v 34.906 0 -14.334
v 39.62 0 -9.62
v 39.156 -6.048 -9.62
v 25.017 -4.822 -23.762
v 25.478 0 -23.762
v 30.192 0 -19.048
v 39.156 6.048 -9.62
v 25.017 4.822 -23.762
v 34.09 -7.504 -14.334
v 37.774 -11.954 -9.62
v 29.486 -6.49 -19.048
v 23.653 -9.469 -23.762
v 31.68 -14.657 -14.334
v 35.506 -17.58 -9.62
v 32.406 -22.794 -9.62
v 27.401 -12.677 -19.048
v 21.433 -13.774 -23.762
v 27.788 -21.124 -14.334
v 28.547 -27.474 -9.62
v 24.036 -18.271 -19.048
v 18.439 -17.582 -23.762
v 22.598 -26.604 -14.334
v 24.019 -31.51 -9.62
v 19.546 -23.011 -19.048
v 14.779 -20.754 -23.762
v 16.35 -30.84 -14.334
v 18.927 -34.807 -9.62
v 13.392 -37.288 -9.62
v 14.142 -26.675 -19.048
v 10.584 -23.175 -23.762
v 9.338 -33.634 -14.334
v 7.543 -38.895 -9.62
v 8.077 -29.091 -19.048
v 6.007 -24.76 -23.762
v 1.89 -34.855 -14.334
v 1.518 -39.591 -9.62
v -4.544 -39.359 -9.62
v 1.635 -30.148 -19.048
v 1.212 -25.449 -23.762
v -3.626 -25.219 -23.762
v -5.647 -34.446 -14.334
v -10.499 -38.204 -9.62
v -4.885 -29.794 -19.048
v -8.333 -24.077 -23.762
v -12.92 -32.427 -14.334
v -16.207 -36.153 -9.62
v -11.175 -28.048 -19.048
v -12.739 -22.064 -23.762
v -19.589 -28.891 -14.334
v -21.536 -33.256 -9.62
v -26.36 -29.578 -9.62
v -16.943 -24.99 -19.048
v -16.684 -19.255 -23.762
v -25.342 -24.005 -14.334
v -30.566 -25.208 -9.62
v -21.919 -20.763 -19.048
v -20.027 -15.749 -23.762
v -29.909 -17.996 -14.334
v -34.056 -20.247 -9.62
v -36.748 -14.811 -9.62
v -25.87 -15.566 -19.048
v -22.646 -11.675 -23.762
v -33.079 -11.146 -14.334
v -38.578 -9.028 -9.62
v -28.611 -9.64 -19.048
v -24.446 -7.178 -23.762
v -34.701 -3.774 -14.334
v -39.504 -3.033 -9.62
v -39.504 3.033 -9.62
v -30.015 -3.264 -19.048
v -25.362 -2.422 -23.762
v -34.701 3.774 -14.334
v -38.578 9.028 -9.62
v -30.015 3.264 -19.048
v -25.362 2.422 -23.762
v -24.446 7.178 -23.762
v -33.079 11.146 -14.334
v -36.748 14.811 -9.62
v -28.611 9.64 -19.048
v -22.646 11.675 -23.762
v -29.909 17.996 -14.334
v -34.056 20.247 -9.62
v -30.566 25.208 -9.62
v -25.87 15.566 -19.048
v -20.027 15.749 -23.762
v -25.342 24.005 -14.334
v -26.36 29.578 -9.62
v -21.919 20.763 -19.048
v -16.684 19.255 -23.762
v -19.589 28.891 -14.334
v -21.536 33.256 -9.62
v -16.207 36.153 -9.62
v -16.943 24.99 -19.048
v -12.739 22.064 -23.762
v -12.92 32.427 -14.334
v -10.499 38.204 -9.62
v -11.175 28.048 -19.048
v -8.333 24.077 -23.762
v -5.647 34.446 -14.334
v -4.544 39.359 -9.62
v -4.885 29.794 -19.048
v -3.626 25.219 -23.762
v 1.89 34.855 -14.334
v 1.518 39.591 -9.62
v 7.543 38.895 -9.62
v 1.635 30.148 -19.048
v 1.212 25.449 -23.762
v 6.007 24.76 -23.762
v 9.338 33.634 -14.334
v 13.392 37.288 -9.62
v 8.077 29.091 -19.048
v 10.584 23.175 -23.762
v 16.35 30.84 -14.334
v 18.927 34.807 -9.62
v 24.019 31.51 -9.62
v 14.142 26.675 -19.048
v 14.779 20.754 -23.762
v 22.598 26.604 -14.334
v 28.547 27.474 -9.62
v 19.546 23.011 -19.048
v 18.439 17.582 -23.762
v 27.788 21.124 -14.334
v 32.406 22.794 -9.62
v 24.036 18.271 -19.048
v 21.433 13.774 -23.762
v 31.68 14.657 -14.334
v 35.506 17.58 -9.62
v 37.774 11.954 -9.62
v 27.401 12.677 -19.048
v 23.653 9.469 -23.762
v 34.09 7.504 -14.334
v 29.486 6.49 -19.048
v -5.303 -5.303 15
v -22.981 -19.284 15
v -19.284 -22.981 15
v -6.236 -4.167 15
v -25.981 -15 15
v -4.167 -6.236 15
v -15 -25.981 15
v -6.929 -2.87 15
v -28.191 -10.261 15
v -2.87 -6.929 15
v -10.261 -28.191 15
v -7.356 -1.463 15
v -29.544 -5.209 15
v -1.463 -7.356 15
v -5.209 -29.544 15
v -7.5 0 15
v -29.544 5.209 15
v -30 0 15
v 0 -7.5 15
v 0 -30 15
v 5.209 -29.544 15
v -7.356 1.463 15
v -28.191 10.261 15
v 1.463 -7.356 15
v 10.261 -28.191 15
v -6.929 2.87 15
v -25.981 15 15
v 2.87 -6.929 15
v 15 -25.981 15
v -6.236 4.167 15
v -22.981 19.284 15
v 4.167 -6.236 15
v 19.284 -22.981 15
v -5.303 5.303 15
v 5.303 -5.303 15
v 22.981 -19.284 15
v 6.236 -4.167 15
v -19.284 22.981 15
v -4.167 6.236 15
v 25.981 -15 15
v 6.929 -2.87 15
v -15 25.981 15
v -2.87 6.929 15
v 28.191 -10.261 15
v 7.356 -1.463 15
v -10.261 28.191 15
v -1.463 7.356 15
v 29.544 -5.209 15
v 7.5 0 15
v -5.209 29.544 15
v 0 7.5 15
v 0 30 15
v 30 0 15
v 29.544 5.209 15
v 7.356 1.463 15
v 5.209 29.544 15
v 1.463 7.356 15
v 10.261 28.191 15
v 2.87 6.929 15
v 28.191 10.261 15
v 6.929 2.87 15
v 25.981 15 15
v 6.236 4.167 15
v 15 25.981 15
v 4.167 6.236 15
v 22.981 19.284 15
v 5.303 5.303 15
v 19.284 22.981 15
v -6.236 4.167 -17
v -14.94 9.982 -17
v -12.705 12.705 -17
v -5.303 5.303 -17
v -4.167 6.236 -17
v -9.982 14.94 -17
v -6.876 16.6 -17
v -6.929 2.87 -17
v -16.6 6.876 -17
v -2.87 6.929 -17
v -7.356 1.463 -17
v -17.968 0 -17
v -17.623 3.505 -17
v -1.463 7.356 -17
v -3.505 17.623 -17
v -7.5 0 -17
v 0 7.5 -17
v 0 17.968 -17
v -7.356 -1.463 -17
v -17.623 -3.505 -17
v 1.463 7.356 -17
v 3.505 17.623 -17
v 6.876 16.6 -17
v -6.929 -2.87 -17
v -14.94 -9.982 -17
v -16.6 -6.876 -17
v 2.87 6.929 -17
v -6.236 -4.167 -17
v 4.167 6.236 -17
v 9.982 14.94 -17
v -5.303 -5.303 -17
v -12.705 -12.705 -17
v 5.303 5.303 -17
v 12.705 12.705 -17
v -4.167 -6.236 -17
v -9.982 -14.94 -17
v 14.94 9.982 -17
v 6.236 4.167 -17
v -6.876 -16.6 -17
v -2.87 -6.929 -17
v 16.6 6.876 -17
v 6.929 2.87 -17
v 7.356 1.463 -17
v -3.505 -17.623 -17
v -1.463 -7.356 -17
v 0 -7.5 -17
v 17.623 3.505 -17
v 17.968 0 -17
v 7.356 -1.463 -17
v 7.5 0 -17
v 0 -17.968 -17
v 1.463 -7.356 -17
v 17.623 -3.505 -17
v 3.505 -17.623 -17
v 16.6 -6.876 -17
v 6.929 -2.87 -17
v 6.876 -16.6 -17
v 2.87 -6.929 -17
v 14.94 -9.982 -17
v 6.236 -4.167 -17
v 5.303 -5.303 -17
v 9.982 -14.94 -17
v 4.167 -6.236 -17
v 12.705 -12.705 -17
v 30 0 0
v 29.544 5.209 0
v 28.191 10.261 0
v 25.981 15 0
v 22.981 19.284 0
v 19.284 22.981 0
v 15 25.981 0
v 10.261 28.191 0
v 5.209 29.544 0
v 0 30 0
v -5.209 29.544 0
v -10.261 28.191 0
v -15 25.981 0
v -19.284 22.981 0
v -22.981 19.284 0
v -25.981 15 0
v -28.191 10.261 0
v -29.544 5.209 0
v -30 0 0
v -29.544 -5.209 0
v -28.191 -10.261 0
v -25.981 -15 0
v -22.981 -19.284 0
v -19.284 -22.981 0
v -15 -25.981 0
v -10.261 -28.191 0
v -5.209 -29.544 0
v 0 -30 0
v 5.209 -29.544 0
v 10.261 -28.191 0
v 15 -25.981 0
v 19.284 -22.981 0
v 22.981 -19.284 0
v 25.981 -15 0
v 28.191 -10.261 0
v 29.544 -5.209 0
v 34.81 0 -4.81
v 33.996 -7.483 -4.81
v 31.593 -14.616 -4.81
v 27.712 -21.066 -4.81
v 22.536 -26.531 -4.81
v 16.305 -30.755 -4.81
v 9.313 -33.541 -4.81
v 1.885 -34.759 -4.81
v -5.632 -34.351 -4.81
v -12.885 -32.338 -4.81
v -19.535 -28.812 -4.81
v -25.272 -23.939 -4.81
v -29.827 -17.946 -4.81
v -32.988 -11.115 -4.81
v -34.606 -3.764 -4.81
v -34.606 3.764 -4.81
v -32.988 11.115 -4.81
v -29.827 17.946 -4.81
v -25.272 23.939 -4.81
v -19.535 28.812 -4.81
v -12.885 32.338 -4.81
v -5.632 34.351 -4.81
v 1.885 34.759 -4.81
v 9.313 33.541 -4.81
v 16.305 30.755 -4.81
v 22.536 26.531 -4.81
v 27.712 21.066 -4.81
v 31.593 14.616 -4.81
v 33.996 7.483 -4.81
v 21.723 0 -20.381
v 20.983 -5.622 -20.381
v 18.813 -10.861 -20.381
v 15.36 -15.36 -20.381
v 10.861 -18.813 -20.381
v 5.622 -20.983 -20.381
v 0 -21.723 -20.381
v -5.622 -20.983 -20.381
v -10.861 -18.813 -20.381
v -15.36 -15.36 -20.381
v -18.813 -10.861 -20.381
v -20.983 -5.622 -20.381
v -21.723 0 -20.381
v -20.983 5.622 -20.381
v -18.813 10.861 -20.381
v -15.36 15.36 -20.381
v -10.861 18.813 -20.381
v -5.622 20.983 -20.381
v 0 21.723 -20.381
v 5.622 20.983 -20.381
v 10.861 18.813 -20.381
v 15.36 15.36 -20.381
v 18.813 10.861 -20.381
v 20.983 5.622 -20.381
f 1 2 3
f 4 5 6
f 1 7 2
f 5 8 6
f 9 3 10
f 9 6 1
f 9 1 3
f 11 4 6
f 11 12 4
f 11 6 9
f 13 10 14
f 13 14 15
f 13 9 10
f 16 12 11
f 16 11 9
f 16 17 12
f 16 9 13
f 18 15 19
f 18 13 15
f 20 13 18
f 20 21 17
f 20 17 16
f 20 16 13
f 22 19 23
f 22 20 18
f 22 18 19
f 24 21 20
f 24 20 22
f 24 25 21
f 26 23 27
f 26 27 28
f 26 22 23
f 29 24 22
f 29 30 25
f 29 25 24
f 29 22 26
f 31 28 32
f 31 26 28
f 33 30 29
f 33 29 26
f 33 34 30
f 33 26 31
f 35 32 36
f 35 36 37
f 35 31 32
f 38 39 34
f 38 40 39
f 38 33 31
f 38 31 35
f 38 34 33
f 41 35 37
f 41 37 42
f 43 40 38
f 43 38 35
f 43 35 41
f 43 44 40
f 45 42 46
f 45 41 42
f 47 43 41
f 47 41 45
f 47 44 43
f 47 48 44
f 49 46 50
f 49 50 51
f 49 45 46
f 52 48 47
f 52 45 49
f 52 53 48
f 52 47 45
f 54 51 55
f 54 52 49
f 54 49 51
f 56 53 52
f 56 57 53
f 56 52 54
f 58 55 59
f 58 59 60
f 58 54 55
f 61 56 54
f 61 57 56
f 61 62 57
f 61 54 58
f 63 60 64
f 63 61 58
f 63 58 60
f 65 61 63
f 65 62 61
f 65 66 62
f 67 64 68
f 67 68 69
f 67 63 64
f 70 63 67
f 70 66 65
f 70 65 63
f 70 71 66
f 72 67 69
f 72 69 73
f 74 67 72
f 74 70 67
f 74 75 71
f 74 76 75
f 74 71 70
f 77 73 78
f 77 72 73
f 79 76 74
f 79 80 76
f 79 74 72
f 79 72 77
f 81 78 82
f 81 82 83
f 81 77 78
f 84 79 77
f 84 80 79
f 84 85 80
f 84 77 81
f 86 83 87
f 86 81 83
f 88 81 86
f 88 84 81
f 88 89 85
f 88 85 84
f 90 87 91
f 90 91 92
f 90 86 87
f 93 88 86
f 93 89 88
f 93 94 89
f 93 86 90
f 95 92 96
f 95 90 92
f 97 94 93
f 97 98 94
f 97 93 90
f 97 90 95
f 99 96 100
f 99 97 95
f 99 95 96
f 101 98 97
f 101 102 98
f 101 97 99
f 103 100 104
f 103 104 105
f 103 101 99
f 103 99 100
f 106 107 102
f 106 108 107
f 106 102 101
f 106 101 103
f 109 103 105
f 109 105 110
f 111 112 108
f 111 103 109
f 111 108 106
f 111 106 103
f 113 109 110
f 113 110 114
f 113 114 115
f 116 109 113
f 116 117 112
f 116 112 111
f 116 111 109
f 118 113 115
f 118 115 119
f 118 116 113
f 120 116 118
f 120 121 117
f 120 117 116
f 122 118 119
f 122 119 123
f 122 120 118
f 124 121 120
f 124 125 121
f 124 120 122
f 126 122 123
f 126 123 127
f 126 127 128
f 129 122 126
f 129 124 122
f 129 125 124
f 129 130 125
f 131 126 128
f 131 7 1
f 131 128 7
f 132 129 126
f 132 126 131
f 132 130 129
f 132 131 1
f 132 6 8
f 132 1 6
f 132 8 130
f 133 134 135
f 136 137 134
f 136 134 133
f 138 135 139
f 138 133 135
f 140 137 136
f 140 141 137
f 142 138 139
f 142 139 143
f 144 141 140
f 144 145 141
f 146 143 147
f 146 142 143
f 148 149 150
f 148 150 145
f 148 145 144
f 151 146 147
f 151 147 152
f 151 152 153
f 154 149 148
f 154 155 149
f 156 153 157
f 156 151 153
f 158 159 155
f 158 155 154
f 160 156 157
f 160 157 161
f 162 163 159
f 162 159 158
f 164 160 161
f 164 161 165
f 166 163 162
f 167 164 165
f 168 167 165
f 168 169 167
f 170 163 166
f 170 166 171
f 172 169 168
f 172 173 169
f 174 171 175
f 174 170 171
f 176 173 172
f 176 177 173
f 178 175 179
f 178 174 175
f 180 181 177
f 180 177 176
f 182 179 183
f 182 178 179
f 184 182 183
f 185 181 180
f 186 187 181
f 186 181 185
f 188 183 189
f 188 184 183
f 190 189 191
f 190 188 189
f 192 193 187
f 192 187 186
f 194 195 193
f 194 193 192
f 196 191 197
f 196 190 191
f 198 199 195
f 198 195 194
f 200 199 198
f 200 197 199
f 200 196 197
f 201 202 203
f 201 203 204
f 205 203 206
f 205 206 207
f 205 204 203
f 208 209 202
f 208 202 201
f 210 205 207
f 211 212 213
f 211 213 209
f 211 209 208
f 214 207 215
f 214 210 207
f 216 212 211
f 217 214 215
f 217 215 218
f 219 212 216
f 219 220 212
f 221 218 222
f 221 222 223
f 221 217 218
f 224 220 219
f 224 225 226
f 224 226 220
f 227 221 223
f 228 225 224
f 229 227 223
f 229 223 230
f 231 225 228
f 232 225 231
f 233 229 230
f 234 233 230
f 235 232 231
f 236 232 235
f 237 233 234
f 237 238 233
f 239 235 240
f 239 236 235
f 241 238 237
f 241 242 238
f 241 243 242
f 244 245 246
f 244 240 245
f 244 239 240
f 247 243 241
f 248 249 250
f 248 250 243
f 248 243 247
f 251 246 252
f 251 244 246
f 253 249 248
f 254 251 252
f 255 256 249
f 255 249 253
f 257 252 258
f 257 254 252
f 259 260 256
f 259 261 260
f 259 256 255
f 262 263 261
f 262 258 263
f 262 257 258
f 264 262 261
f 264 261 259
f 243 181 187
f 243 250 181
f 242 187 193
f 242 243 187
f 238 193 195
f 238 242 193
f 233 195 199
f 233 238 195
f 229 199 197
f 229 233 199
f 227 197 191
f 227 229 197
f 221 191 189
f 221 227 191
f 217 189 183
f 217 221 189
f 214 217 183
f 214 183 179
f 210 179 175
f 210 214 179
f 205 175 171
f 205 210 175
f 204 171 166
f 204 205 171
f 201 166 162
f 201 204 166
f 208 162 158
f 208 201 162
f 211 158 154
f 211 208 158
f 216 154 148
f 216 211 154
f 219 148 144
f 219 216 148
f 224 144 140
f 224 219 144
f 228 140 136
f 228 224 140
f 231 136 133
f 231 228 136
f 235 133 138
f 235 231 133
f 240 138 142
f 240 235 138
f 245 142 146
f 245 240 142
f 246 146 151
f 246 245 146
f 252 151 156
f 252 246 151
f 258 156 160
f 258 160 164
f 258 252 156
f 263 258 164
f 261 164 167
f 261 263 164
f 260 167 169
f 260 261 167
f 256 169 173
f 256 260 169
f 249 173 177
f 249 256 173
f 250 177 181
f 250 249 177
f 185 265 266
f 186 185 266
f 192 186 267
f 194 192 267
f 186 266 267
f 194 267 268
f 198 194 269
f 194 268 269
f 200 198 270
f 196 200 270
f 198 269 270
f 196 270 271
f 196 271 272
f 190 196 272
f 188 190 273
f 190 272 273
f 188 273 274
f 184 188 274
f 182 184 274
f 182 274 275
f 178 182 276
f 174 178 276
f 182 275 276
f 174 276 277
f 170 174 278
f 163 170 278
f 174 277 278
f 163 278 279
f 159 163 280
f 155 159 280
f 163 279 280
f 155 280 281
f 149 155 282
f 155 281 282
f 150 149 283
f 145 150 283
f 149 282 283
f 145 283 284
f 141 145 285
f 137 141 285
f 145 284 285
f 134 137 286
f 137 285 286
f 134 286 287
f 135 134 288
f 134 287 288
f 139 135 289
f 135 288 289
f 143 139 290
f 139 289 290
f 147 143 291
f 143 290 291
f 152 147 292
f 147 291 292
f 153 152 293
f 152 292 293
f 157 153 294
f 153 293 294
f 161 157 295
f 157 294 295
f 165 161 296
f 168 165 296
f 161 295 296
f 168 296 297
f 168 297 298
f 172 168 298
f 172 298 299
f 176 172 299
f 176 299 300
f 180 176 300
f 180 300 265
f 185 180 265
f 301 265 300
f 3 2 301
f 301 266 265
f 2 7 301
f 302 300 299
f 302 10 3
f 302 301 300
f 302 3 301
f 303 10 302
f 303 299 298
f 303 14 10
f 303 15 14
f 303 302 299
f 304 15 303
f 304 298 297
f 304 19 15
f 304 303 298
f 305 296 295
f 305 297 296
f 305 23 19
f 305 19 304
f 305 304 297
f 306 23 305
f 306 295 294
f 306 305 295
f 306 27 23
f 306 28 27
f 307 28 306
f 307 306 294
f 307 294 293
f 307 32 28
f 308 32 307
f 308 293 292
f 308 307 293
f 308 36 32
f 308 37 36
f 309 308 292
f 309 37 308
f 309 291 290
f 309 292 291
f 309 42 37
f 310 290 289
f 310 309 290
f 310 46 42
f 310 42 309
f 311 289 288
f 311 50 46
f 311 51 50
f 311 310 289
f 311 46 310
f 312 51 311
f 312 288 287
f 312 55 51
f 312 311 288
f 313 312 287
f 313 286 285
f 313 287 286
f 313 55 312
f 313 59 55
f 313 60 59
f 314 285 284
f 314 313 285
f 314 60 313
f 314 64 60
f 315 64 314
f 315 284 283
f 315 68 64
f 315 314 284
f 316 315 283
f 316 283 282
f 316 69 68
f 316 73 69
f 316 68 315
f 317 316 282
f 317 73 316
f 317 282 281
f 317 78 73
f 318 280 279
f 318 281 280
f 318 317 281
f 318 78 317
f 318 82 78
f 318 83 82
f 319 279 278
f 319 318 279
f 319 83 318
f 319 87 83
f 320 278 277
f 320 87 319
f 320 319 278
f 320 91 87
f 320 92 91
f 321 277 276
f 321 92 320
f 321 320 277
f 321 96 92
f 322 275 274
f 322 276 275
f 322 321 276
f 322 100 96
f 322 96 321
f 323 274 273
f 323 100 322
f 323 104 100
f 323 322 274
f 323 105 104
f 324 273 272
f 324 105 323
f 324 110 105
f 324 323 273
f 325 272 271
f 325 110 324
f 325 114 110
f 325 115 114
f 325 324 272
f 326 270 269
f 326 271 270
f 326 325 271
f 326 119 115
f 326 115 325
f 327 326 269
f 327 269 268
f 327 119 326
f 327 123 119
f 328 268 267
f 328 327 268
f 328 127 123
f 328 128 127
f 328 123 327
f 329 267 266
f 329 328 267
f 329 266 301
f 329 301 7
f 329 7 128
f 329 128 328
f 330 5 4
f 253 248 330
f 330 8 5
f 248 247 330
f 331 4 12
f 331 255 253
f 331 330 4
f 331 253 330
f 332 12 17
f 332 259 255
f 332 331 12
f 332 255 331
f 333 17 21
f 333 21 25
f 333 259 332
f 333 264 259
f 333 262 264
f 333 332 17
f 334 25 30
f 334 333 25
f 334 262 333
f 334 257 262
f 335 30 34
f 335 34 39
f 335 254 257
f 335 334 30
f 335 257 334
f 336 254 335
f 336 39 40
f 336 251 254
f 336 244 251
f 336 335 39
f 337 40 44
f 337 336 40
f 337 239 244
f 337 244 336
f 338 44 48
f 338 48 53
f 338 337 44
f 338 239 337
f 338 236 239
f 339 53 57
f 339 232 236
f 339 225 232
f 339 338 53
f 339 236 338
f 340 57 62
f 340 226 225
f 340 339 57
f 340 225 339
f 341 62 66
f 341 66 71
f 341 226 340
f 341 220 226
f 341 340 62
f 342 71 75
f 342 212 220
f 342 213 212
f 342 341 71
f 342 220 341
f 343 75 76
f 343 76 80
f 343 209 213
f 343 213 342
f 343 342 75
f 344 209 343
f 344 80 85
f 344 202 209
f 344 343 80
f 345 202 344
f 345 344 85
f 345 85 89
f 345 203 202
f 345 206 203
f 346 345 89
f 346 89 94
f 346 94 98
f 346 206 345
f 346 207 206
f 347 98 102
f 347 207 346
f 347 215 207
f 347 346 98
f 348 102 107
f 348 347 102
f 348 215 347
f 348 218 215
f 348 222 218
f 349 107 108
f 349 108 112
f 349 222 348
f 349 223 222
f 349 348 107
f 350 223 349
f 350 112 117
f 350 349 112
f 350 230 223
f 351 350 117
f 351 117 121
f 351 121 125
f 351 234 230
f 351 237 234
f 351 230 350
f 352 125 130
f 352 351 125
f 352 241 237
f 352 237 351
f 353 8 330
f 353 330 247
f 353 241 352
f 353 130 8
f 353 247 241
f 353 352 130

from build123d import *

# Parameters (mm, degrees)
SKETCH1_R           = 30
SKETCH1_R_2         = 7.5
BOSS_EXTRUDE1_DEPTH = 15


with BuildPart() as part:
    # Sketch1 → Boss-Extrude1 (new body)
    with BuildSketch(Plane.XY):
        Circle(SKETCH1_R)
        Circle(SKETCH1_R_2, mode=Mode.SUBTRACT)
    extrude(amount=BOSS_EXTRUDE1_DEPTH)

    # Sketch2 → Revolve4 (revolve)
    with BuildSketch(Plane(origin=(0, 0, 0), x_dir=(1, 0, 0), z_dir=(0, 1, 0))):
        Polygon((7.5, 0), (30, 0), (39.62, 9.62), (25.477864376, 23.762135624), (17.967751926, 17), (7.5, 17), align=None)
    revolve(axis=Axis((0, 0, 0), (0, 0, -1)))


solid = part.part
